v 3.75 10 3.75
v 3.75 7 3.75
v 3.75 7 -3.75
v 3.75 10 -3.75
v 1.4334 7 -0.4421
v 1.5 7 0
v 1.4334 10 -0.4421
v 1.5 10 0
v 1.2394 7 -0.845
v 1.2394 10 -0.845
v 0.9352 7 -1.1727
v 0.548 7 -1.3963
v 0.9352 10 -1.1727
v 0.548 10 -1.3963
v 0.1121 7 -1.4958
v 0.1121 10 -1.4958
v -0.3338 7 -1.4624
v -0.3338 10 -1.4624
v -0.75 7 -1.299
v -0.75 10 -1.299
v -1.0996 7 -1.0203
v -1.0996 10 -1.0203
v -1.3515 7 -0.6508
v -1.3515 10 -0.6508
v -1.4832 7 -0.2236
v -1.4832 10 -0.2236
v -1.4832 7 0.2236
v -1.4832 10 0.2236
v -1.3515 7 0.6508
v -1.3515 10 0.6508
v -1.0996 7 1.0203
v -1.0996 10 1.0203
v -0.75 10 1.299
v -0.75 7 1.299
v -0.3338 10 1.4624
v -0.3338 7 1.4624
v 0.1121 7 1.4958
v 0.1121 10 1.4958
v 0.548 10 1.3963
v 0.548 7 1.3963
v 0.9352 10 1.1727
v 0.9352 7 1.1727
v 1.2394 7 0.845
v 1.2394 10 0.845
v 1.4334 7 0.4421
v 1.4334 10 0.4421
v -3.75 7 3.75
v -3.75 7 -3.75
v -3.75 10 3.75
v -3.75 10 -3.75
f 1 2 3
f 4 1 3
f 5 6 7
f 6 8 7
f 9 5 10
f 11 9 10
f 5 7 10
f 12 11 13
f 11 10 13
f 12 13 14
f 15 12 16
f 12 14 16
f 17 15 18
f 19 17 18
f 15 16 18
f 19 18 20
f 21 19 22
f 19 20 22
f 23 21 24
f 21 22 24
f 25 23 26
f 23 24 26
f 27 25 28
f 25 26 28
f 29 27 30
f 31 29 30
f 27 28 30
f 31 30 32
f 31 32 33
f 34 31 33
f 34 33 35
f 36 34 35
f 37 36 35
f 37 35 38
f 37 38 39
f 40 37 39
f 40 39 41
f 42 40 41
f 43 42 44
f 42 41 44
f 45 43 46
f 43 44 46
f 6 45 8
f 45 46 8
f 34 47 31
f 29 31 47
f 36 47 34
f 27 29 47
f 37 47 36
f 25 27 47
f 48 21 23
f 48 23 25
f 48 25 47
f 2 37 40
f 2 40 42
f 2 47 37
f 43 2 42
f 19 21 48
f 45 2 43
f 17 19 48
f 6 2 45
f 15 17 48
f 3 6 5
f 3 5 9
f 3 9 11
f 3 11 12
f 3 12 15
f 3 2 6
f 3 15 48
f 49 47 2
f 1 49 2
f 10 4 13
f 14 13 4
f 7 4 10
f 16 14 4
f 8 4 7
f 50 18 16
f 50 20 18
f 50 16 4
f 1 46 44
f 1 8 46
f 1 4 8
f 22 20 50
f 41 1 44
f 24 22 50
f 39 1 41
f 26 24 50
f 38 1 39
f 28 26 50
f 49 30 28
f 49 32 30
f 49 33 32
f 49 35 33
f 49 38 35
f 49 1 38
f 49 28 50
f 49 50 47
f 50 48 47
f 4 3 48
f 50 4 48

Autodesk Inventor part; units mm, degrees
ref_plane "YZ Plane" through (0, 0, 0) normal (1, 0, 0) x (0, 1, 0)
ref_plane "XZ Plane" through (0, 0, 0) normal (0, 1, 0) x (-1, 0, 0)
ref_plane "XY Plane" through (0, 0, 0) normal (0, 0, 1) x (1, 0, 0)
sketch "Sketch6" plane through (0, 0, 0) normal (0, 1, 0) x (-1, 0, 0)
  line L0 (-3.75, -3.75) -> (3.75, -3.75)
  line L1 (3.75, -3.75) -> (3.75, 3.75)
  line L2 (3.75, 3.75) -> (-3.75, 3.75)
  line L3 (-3.75, 3.75) -> (-3.75, -3.75)
  line L4 (-3.75, -3.75) -> (3.75, 3.75) construction
  line L5 (3.75, -3.75) -> (-3.75, 3.75) construction
  point P0 (0, 0)
  dimension "d4" = 7.5
  dimension "d5" = 7.5
extrude "Extrusion2" add sketch "Sketch6" along normal blind 10
sketch "Sketch7" plane through (3.75, 0, 3.75) normal (1, 0, 0) x (0, 0, -1)
  line L0 (7.5, 0) -> (0, 0) projected
  line L1 (0, 0) -> (7.5, 0)
  line L2 (0, 0) -> (0, 7)
  line L3 (0, 7) -> (7.5, 7)
  line L4 (7.5, 7) -> (7.5, 0)
  line L5 (7.5, 0) -> (0, 0)
  line L6 (0, 0) -> (0, 10) projected
  line L7 (7.5, 0) -> (7.5, 10) projected
  point P0 (3.75, 0)
  dimension "d9" = 7
  dimension "d19" = 0
  dimension "d20" = 0
extrude "Extrusion3" cut sketch "Sketch7" against normal blind 9.05
sketch "Sketch8" plane through (0, 10, 0) normal (0, 1, 0) x (1, 0, 0)
  circle A0 centre (0, 0) radius 1.5
  dimension "d13" = 3
extrude "Extrusion4" cut sketch "Sketch8" against normal blind 5.2375
properties part number "Holder"
